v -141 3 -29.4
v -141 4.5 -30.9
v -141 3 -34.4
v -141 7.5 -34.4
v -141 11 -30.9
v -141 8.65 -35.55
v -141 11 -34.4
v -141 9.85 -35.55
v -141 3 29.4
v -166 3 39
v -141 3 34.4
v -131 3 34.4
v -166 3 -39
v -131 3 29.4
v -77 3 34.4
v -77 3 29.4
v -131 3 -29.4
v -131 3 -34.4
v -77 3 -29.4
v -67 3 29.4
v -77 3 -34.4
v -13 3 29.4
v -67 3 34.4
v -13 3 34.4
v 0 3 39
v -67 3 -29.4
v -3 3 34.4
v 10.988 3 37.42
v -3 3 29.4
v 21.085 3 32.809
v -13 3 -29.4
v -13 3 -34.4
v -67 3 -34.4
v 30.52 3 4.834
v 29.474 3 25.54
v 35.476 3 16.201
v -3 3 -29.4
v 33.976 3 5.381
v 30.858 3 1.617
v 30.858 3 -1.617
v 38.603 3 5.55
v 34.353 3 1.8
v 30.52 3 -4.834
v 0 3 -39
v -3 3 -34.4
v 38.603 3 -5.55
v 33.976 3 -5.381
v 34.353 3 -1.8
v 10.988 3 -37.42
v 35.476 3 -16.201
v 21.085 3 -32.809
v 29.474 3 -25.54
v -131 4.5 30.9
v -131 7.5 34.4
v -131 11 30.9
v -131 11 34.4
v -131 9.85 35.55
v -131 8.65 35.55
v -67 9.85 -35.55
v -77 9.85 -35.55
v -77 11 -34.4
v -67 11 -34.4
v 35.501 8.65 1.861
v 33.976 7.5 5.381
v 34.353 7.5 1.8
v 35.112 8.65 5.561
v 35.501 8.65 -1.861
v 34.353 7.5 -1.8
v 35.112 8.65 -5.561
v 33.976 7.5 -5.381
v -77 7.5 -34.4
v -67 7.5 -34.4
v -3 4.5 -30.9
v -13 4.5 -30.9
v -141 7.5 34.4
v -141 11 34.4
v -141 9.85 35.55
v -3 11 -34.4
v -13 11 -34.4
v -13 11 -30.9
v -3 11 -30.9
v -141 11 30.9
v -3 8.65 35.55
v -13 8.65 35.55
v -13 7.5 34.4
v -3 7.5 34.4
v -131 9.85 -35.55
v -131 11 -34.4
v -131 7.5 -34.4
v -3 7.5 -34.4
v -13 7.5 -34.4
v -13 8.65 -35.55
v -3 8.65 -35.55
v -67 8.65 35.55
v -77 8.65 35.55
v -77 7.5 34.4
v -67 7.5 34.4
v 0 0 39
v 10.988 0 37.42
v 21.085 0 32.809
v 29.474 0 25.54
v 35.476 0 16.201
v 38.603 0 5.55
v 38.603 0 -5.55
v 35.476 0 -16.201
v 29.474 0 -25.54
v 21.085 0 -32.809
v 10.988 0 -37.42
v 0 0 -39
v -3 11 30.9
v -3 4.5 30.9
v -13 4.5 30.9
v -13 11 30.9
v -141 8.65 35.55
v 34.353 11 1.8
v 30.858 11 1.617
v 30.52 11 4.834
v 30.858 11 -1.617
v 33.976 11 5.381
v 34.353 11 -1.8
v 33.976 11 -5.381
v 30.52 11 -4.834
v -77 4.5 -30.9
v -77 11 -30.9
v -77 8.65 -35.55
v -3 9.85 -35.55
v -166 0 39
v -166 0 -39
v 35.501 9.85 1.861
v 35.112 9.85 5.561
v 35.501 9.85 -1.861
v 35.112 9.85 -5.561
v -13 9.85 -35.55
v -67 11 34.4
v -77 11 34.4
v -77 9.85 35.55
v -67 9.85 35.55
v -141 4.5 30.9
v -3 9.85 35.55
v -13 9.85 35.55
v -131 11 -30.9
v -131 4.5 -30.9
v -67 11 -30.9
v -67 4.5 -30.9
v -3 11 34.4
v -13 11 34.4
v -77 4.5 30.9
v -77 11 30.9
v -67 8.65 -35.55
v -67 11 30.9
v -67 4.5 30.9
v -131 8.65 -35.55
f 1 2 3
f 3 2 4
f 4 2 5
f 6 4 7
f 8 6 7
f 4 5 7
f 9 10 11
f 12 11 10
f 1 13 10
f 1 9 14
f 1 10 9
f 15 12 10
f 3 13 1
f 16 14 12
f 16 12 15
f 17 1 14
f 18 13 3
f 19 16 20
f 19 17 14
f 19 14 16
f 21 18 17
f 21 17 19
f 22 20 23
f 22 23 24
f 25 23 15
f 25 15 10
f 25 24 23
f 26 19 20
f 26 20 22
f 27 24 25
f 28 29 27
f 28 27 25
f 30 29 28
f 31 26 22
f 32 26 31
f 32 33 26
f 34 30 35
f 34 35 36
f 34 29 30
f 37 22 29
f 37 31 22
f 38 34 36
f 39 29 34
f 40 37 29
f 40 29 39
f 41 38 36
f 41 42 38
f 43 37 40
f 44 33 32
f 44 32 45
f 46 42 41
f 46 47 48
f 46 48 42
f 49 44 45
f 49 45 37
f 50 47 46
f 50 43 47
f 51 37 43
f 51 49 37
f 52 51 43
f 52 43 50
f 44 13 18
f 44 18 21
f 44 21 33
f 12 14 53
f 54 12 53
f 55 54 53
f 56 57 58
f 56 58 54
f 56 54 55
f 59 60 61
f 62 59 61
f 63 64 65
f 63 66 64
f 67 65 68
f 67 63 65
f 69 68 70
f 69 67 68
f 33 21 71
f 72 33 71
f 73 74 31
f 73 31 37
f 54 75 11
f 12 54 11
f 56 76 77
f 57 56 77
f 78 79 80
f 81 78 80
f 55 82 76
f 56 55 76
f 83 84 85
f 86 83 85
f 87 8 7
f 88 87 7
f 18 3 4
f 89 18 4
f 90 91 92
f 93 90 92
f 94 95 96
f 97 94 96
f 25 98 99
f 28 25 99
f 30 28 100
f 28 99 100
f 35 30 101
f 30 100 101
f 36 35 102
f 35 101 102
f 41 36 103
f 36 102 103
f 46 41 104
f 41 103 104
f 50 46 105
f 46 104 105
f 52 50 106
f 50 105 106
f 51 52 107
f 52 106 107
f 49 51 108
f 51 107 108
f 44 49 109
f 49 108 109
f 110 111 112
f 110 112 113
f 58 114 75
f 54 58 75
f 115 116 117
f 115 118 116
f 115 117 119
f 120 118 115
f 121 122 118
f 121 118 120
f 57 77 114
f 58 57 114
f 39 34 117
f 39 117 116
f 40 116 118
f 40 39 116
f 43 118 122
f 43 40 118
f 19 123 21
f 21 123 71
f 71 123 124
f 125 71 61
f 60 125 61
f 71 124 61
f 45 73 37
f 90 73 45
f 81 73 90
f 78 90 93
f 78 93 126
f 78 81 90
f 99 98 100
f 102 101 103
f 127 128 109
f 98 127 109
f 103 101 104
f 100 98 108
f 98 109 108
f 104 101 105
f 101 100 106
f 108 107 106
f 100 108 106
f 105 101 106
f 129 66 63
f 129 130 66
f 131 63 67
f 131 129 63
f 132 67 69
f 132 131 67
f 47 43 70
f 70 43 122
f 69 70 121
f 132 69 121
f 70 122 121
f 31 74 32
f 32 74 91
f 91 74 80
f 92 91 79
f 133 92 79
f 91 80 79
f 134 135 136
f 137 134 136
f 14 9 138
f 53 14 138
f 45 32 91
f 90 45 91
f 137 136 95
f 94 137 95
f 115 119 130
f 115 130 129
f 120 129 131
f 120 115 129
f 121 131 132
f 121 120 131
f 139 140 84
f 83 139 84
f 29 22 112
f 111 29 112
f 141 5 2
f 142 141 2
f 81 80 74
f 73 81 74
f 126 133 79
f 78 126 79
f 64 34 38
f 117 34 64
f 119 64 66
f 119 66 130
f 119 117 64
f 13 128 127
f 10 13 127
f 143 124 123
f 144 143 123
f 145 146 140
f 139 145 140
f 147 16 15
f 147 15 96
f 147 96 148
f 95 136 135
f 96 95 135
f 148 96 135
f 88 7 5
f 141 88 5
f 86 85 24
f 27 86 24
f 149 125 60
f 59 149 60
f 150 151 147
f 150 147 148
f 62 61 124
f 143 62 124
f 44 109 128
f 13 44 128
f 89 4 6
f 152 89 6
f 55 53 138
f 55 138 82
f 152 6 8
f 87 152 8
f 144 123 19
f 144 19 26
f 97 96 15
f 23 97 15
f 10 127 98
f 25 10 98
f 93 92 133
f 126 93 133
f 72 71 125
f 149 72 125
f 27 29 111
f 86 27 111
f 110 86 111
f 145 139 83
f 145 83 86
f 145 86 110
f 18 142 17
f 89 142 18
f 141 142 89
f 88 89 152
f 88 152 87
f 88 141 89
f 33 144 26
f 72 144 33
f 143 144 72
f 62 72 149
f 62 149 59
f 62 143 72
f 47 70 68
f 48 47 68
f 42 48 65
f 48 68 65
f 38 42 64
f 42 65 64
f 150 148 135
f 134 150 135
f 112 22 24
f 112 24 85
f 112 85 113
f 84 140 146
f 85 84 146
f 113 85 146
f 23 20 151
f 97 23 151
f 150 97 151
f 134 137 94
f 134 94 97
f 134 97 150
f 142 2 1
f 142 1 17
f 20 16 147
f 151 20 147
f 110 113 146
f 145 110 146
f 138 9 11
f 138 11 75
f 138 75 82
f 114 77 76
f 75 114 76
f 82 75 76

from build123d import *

# Parameters (mm, degrees)
BOSS_EXTRUDE1_DEPTH        = 3
BOSS_EXTRUDE2_DEPTH        = 10
CHAMFER1_SIZE              = 1.5
LPATTERN1_COUNT            = 3
LPATTERN1_PITCH            = 64
CHAMFER1_OF_LPATTERN1_SIZE = 1.5
MIRROR1_START              = -141
MIRROR1_DEPTH              = 10
MIRROR1_START_2            = -77
MIRROR1_2_DEPTH            = 10
MIRROR1_START_3            = -13
MIRROR1_3_DEPTH            = 10
REVOLVE1_ANGLE             = 18


# Read off the part's stored shape, not the designer's step: Mirror1
with BuildPart() as part:
    # Sketch1 → Boss-Extrude1 (new body)
    with BuildSketch(Plane(origin=(0, 0, 0), x_dir=(1, 0, 0), z_dir=(0, 1, 0))):
        with BuildLine():
            Line((0, 39), (-166, 39))
            Line((-166, 39), (-166, -39))
            Line((-166, -39), (0, -39))
            ThreePointArc((0, -39), (39, 0), (0, 39))
        make_face()
    extrude(amount=BOSS_EXTRUDE1_DEPTH)

    # Sketch3 → Boss-Extrude2 (add)
    with BuildSketch(Plane.ZY.offset(141)):
        Polygon((-34.4, 3), (-34.4, 7.5), (-35.55, 8.65), (-35.55, 9.85), (-34.4, 11), (-30.9, 11), (-30.9, 3), align=None)
    boss_extrude2 = extrude(amount=-BOSS_EXTRUDE2_DEPTH)

    # Chamfer1
    chamfer1_edges = [part.edges().sort_by_distance(p)[0] for p in [
        (-136, 3, -30.9),
    ]]
    chamfer(chamfer1_edges, length=CHAMFER1_SIZE)

    # LPattern1: Boss-Extrude2 ×3
    with Locations(*[(i * LPATTERN1_PITCH, 0, 0) for i in range(1, LPATTERN1_COUNT)]):
        add(boss_extrude2)

    # Chamfer1 of LPattern1
    chamfer1_of_lpattern1_edges = [part.edges().sort_by_distance(p)[0] for p in [
        (-72, 3, -30.9),
        (-8, 3, -30.9),
    ]]
    chamfer(chamfer1_of_lpattern1_edges, length=CHAMFER1_OF_LPATTERN1_SIZE)

    # Mirror1 outline → Mirror1 (add)
    with BuildSketch(Plane.YZ.offset(MIRROR1_START)):
        Polygon((11, 30.9), (11, 34.4), (9.85, 35.55), (8.65, 35.55), (7.5, 34.4), (3, 34.4), (3, 29.4), (4.5, 30.9), align=None)
    extrude(amount=MIRROR1_DEPTH)

    # Mirror1 2 outline → Mirror1 2 (add)
    with BuildSketch(Plane.YZ.offset(MIRROR1_START_2)):
        Polygon((11, 30.9), (11, 34.4), (9.85, 35.55), (8.65, 35.55), (7.5, 34.4), (3, 34.4), (3, 29.4), (4.5, 30.9), align=None)
    extrude(amount=MIRROR1_2_DEPTH)

    # Mirror1 3 outline → Mirror1 3 (add)
    with BuildSketch(Plane.YZ.offset(MIRROR1_START_3)):
        Polygon((11, 30.9), (11, 34.4), (9.85, 35.55), (8.65, 35.55), (7.5, 34.4), (3, 34.4), (3, 29.4), (4.5, 30.9), align=None)
    extrude(amount=MIRROR1_3_DEPTH)

    # Sketch4 → Revolve1 (revolve, symmetric)
    with BuildSketch(Plane.XY) as revolve1_sk:
        Polygon((30.9, 11), (30.9, 3), (34.4, 3), (34.4, 7.5), (35.55, 8.65), (35.55, 9.85), (34.4, 11), align=None)
    revolve(axis=Axis((0, 3, 0), (0, -1, 0)), revolution_arc=REVOLVE1_ANGLE / 2)
    revolve(revolve1_sk.sketch, axis=Axis((0, 3, 0), (0, 1, 0)), revolution_arc=REVOLVE1_ANGLE / 2)


solid = part.part
